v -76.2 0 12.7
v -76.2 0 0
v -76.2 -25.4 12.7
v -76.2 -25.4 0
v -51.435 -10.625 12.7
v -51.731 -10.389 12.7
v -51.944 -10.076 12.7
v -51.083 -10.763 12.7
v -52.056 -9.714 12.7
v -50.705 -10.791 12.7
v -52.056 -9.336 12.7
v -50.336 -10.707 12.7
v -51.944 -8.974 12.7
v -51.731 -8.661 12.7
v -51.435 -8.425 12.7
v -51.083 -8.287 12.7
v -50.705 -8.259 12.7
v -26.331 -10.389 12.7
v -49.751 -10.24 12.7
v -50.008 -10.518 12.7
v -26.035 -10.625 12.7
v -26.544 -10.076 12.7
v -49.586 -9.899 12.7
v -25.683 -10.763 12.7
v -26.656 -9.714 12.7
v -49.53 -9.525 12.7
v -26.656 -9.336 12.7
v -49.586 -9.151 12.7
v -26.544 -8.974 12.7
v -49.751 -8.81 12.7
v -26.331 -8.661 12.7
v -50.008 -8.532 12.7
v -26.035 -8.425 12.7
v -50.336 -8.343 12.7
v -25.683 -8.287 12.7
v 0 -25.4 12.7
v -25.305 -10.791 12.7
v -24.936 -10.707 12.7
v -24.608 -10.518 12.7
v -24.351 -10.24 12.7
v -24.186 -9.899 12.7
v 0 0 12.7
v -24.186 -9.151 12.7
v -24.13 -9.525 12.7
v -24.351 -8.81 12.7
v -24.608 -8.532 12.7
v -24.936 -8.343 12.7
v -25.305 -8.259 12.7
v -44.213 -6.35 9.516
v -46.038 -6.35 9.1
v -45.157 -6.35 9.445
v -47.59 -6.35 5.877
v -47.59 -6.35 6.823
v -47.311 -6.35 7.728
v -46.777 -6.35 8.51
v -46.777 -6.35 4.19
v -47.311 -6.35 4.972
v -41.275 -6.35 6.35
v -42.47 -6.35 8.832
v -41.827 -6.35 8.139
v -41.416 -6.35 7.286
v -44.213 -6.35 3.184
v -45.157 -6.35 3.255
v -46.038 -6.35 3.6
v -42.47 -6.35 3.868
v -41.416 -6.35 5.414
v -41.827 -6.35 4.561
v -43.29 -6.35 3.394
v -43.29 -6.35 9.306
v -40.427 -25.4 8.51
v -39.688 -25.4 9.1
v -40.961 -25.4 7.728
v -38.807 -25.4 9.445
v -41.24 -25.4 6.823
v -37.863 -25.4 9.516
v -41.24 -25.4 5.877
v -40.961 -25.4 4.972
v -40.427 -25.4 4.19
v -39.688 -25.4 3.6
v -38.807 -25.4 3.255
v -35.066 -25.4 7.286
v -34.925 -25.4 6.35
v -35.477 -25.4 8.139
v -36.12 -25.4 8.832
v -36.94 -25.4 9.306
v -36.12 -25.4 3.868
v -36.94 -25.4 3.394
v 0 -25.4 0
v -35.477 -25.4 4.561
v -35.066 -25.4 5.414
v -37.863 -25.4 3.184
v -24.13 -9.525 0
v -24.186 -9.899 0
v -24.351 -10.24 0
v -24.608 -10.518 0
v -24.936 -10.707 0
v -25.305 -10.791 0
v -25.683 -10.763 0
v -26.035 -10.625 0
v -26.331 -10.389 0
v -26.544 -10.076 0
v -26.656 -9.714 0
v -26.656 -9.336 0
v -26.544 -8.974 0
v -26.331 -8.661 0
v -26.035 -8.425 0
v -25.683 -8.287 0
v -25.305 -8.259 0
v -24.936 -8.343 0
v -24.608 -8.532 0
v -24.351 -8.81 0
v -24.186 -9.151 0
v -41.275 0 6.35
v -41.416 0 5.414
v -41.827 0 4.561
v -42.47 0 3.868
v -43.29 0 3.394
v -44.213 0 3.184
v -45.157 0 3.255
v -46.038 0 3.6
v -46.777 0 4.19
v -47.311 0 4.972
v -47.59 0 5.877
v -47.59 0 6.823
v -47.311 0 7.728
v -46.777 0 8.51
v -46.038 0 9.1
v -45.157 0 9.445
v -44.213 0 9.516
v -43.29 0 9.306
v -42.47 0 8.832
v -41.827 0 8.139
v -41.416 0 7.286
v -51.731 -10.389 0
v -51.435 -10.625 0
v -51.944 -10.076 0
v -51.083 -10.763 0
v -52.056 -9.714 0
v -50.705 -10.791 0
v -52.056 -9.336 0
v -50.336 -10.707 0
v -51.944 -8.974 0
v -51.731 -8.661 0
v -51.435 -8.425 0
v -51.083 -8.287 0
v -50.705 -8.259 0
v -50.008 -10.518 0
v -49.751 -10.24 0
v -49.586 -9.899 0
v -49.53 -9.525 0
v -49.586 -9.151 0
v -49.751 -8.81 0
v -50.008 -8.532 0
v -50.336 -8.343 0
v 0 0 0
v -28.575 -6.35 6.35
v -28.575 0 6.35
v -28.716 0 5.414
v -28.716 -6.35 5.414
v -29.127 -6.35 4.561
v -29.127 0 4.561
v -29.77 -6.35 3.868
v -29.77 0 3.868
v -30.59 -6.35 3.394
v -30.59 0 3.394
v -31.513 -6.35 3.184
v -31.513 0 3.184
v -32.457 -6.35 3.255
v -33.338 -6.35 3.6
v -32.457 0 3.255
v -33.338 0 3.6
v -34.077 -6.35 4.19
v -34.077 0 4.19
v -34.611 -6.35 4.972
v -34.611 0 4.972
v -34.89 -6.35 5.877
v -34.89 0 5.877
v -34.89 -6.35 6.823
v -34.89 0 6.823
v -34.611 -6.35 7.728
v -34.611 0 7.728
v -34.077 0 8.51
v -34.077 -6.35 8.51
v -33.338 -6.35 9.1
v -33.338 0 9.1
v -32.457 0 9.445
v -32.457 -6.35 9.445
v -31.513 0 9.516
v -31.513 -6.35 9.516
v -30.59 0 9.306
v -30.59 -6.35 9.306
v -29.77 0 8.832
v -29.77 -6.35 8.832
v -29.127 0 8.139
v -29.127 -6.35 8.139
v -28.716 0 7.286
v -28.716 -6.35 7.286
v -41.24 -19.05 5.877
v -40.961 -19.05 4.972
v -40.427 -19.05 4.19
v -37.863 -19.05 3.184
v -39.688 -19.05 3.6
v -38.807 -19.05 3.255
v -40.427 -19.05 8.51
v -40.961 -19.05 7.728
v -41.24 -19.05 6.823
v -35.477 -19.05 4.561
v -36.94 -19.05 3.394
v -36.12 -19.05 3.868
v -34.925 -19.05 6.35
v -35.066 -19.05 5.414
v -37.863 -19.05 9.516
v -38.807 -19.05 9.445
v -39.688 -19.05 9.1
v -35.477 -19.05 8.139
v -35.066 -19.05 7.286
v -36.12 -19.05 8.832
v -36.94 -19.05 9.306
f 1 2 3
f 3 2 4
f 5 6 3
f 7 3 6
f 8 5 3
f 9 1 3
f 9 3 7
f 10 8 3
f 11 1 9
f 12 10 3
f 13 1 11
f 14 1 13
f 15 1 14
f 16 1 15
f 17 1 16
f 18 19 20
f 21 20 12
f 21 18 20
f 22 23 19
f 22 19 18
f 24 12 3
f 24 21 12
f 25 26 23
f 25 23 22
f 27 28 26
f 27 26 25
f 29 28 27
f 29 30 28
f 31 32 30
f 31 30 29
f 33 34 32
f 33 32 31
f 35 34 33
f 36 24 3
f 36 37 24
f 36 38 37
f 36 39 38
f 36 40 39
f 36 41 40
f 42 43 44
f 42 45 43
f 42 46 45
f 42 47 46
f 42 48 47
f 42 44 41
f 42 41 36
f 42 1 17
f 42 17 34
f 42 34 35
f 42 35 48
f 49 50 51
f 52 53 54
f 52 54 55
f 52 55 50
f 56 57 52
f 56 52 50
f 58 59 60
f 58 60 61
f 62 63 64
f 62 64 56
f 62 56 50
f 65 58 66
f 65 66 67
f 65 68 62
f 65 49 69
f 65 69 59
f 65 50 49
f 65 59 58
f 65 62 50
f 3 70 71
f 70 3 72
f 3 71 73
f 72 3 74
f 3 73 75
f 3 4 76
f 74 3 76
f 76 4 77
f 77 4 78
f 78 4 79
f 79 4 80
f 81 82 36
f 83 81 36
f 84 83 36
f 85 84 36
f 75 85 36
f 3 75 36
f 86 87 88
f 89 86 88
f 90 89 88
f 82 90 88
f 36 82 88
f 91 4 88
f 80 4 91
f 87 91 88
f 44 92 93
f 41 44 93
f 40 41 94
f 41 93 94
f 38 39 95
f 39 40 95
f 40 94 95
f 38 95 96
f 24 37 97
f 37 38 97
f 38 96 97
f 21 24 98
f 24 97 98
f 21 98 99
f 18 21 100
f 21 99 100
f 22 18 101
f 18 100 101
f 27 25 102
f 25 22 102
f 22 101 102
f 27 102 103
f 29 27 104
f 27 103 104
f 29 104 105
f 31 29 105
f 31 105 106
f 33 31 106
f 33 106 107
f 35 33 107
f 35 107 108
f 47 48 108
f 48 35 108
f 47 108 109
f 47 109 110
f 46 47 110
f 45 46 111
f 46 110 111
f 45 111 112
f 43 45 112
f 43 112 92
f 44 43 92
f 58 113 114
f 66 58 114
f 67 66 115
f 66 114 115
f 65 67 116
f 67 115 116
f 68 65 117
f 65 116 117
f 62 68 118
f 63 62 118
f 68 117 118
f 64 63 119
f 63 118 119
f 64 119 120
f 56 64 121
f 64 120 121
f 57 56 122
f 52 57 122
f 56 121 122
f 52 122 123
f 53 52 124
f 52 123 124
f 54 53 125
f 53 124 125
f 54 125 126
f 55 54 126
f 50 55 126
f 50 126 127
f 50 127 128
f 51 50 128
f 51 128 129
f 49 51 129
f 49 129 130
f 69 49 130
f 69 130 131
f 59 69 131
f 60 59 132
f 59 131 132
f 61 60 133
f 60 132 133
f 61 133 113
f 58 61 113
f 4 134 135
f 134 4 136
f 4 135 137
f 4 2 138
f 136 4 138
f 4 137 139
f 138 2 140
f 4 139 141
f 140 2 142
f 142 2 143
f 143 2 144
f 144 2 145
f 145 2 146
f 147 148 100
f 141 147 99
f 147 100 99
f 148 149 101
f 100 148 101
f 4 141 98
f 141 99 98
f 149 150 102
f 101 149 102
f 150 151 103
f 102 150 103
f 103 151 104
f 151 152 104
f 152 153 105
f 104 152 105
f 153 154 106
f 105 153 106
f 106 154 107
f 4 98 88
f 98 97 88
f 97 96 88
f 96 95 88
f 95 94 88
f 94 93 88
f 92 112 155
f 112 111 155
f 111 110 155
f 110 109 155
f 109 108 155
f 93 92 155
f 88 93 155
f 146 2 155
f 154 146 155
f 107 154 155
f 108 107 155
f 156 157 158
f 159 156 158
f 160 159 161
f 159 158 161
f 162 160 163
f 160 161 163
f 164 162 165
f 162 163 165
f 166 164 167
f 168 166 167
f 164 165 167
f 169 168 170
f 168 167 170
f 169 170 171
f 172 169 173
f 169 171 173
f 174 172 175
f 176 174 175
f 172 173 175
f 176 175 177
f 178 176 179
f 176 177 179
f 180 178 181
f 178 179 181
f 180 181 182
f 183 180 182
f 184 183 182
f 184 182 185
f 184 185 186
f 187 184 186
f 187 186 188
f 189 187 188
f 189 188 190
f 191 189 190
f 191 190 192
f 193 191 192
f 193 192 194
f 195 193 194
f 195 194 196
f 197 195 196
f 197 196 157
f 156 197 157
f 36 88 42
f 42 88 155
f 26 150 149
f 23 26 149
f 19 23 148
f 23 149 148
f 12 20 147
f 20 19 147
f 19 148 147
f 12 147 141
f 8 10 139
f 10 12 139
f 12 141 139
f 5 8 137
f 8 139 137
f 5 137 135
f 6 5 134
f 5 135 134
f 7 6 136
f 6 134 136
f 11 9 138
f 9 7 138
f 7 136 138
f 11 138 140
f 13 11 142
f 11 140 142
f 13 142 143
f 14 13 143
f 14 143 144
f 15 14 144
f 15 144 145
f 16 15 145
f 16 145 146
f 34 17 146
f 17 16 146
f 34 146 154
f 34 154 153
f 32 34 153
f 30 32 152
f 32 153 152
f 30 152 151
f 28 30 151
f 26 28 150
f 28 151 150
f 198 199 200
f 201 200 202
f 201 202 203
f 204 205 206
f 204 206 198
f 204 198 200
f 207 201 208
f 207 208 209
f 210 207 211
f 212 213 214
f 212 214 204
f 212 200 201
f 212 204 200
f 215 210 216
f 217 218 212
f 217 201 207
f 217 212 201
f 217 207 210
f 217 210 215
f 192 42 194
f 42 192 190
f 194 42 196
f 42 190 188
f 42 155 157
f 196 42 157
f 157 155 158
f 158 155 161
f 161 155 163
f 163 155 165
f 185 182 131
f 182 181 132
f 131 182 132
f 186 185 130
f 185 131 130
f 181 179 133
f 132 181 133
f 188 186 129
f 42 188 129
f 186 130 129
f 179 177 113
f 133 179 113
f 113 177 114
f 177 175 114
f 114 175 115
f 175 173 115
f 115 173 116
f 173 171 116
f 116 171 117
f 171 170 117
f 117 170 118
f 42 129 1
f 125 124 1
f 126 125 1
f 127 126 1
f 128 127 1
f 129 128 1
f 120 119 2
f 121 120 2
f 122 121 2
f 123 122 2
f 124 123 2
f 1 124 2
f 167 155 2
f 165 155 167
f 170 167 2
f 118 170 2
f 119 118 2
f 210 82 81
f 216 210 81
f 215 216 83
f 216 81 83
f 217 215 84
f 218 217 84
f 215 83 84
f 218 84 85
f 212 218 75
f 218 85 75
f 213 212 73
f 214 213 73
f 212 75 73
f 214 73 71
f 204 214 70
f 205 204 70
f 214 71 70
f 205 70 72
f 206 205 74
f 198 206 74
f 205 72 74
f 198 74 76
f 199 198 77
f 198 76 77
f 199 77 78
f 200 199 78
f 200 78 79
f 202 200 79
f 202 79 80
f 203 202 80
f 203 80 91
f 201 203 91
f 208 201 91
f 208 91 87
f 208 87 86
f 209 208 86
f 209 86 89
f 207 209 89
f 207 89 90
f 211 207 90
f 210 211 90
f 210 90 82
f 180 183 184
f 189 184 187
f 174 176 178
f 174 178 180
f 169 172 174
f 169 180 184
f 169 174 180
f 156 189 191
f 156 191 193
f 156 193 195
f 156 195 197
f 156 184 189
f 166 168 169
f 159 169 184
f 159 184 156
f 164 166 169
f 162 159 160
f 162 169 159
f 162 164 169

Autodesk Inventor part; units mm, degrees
ref_plane "YZ Plane" through (0, 0, 0) normal (1, 0, 0) x (0, 1, 0)
ref_plane "XZ Plane" through (0, 0, 0) normal (0, 1, 0) x (-1, 0, 0)
ref_plane "XY Plane" through (0, 0, 0) normal (0, 0, 1) x (1, 0, 0)
sketch "Sketch1" plane through (0, 0, 0) normal (0, 0, 1) x (1, 0, 0)
  line L0 (0, 0) -> (-76.2, 0)
  line L1 (-76.2, 0) -> (-76.2, -25.4)
  line L2 (-76.2, -25.4) -> (0, -25.4)
  line L3 (0, -25.4) -> (0, 0)
  circle A0 centre (-50.8, -9.525) radius 1.27
  circle A1 centre (-25.4, -9.525) radius 1.27
  dimension "d0" = 76.2
  dimension "d1" = 25.4
  dimension "d2" = 25.4
  dimension "d3" = 25.4
  dimension "d4" = 2.54
  dimension "d5" = 9.525
  dimension "d6" = 9.525
extrude "Extrusion1" add sketch "Sketch1" along normal blind 12.7
sketch "Sketch2" plane through (-76.2, 0, 0) normal (0, 1, 0) x (1, 0, 0)
  circle A0 centre (31.75, -6.35) radius 3.175
  circle A1 centre (44.45, -6.35) radius 3.175
  line L0 (0, 0) -> (76.2, 0) projected
  line L1 (0, 0) -> (0, -12.7) projected
  line L2 (76.2, 0) -> (76.2, -12.7) projected
  dimension "d9" = 6.35
  dimension "d10" = 6.35
  dimension "d11" = 6.35
  dimension "d12" = 6.35
  dimension "d13" = 31.75
  dimension "d14" = 31.75
extrude "Extrusion2" cut sketch "Sketch2" against normal blind 6.35
sketch "Sketch3" plane through (-76.2, -25.4, 0) normal (0, -1, 0) x (1, 0, 0)
  circle A0 centre (38.1, 6.35) radius 3.175
  line L0 (76.2, 0) -> (76.2, 12.7) projected
  line L1 (0, 0) -> (76.2, 0) projected
  dimension "d17" = 6.35
  dimension "d18" = 38.1
  dimension "d19" = 6.35
extrude "Extrusion3" cut sketch "Sketch3" against normal blind 6.35
properties part number "solenoid valve" material "PC/ABS Plastic"
